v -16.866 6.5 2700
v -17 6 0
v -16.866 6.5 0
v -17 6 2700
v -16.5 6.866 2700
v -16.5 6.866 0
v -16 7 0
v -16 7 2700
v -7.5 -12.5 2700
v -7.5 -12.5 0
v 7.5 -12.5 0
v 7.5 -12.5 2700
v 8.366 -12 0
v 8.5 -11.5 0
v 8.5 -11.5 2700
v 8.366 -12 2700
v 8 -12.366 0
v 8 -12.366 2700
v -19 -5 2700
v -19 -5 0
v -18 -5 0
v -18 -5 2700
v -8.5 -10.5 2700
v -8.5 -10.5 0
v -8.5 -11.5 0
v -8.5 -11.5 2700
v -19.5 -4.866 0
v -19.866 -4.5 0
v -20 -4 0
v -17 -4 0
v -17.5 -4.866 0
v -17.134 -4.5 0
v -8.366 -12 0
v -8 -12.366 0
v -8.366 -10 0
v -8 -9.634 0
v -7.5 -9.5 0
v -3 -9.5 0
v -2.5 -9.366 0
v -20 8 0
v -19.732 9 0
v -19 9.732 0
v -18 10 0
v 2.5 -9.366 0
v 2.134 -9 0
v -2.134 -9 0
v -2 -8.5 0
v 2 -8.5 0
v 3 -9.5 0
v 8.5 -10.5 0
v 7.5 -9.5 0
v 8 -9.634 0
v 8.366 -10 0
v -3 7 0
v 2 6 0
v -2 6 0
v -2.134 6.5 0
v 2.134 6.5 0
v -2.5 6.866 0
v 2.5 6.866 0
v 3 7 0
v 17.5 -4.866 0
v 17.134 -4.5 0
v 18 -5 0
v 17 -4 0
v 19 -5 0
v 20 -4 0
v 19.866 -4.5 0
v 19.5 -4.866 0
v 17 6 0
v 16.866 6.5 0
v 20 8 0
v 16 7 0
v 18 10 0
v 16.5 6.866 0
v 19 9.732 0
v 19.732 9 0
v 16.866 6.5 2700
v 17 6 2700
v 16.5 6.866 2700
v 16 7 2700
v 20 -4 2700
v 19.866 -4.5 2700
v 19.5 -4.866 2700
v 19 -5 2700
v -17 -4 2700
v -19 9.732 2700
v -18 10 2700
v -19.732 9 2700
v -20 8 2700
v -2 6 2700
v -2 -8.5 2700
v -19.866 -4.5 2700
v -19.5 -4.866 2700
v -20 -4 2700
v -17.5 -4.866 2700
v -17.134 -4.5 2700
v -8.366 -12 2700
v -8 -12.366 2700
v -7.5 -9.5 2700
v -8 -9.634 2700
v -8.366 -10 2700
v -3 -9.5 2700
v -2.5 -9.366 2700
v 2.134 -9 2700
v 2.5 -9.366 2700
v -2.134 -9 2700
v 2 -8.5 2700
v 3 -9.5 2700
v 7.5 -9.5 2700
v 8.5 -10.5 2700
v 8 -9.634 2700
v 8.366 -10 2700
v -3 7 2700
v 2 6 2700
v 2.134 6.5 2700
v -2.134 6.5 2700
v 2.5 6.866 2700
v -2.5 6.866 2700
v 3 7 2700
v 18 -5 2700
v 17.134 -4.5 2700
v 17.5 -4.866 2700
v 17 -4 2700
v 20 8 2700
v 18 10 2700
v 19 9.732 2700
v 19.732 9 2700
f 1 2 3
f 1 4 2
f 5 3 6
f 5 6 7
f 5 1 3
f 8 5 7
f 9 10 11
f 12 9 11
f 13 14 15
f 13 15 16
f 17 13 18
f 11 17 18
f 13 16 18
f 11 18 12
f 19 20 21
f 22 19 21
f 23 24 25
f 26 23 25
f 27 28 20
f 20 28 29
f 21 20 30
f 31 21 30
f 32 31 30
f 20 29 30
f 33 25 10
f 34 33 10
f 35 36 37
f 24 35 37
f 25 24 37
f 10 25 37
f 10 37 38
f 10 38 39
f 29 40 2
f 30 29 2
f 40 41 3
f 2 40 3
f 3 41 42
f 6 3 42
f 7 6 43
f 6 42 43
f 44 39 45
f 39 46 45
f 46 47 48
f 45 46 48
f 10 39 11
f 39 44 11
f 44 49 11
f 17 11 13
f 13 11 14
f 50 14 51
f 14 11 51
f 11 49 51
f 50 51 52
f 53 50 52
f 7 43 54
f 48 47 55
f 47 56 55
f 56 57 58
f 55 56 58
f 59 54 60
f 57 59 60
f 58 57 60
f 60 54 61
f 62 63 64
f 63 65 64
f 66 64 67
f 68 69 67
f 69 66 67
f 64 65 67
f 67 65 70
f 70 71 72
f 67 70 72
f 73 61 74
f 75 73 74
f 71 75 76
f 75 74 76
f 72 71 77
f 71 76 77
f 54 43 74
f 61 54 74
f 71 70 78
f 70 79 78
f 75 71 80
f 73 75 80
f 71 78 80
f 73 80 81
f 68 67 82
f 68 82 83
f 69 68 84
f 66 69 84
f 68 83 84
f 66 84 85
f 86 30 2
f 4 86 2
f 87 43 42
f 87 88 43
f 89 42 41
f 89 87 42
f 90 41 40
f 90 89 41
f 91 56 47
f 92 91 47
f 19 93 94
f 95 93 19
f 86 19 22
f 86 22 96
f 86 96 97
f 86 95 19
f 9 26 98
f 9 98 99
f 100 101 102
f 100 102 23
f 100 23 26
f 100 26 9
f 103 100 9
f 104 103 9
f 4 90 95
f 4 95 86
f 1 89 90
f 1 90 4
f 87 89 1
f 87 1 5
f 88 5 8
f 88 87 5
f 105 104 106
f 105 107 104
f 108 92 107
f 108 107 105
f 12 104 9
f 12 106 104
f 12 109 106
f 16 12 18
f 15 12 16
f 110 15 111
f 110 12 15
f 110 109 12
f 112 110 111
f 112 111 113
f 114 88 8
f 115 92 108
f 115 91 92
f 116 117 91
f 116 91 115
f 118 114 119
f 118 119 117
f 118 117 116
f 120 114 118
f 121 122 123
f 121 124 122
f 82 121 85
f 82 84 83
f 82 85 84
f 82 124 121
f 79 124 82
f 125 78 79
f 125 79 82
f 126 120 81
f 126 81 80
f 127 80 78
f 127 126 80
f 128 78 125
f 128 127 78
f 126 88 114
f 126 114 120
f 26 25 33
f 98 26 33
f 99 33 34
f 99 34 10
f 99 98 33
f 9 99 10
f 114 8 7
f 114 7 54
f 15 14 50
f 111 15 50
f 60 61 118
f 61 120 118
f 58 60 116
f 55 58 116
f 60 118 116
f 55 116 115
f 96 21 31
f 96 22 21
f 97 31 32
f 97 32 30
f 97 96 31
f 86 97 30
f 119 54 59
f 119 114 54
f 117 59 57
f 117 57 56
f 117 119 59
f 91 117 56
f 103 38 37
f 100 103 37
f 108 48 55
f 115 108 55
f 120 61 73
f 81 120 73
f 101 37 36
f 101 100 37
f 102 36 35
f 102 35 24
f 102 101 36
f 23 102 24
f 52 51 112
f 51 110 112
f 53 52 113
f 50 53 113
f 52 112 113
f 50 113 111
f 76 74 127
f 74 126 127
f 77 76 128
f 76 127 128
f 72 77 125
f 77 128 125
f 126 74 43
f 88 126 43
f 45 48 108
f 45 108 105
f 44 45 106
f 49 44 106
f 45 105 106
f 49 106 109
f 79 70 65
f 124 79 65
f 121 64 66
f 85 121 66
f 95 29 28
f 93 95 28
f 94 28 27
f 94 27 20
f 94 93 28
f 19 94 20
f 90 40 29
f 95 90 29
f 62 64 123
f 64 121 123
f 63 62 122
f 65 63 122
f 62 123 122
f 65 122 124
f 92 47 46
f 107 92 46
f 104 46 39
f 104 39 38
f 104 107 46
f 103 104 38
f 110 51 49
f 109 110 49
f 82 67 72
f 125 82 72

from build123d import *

# Parameters (mm, degrees)
F1_DEPTH = 2700
F2_R     = 2
F3_R     = 1


with BuildPart() as f1:
    # F0 (on Top) → F1 (new body)
    with BuildSketch(Plane.XY):
        Polygon((20, 10), (-20, 10), (-20, -5), (-17, -5), (-17, 7), (-2, 7), (-2, -9.5), (-8.5, -9.5), (-8.5, -12.5), (0, -12.5), (8.5, -12.5), (8.5, -9.5), (2, -9.5), (2, 7), (17, 7), (17, -5), (20, -5), align=None)
    extrude(amount=F1_DEPTH)

    # F2
    f2_edges = [f1.edges().sort_by_distance(p)[0] for p in [
        (-20, 10, 1350),
        (20, 10, 1350),
    ]]
    fillet(f2_edges, radius=F2_R)

    # F3
    f3_edges = [f1.edges().sort_by_distance(p)[0] for p in [
        (-17, 7, 1350),
        (-17, -5, 1350),
        (-20, -5, 1350),
        (-8.5, -12.5, 1350),
        (8.5, -12.5, 1350),
        (8.5, -9.5, 1350),
        (17, -5, 1350),
        (20, -5, 1350),
        (2, 7, 1350),
        (17, 7, 1350),
        (-2, 7, 1350),
        (-8.5, -9.5, 1350),
        (-2, -9.5, 1350),
        (2, -9.5, 1350),
    ]]
    fillet(f3_edges, radius=F3_R)


solid = f1.part
